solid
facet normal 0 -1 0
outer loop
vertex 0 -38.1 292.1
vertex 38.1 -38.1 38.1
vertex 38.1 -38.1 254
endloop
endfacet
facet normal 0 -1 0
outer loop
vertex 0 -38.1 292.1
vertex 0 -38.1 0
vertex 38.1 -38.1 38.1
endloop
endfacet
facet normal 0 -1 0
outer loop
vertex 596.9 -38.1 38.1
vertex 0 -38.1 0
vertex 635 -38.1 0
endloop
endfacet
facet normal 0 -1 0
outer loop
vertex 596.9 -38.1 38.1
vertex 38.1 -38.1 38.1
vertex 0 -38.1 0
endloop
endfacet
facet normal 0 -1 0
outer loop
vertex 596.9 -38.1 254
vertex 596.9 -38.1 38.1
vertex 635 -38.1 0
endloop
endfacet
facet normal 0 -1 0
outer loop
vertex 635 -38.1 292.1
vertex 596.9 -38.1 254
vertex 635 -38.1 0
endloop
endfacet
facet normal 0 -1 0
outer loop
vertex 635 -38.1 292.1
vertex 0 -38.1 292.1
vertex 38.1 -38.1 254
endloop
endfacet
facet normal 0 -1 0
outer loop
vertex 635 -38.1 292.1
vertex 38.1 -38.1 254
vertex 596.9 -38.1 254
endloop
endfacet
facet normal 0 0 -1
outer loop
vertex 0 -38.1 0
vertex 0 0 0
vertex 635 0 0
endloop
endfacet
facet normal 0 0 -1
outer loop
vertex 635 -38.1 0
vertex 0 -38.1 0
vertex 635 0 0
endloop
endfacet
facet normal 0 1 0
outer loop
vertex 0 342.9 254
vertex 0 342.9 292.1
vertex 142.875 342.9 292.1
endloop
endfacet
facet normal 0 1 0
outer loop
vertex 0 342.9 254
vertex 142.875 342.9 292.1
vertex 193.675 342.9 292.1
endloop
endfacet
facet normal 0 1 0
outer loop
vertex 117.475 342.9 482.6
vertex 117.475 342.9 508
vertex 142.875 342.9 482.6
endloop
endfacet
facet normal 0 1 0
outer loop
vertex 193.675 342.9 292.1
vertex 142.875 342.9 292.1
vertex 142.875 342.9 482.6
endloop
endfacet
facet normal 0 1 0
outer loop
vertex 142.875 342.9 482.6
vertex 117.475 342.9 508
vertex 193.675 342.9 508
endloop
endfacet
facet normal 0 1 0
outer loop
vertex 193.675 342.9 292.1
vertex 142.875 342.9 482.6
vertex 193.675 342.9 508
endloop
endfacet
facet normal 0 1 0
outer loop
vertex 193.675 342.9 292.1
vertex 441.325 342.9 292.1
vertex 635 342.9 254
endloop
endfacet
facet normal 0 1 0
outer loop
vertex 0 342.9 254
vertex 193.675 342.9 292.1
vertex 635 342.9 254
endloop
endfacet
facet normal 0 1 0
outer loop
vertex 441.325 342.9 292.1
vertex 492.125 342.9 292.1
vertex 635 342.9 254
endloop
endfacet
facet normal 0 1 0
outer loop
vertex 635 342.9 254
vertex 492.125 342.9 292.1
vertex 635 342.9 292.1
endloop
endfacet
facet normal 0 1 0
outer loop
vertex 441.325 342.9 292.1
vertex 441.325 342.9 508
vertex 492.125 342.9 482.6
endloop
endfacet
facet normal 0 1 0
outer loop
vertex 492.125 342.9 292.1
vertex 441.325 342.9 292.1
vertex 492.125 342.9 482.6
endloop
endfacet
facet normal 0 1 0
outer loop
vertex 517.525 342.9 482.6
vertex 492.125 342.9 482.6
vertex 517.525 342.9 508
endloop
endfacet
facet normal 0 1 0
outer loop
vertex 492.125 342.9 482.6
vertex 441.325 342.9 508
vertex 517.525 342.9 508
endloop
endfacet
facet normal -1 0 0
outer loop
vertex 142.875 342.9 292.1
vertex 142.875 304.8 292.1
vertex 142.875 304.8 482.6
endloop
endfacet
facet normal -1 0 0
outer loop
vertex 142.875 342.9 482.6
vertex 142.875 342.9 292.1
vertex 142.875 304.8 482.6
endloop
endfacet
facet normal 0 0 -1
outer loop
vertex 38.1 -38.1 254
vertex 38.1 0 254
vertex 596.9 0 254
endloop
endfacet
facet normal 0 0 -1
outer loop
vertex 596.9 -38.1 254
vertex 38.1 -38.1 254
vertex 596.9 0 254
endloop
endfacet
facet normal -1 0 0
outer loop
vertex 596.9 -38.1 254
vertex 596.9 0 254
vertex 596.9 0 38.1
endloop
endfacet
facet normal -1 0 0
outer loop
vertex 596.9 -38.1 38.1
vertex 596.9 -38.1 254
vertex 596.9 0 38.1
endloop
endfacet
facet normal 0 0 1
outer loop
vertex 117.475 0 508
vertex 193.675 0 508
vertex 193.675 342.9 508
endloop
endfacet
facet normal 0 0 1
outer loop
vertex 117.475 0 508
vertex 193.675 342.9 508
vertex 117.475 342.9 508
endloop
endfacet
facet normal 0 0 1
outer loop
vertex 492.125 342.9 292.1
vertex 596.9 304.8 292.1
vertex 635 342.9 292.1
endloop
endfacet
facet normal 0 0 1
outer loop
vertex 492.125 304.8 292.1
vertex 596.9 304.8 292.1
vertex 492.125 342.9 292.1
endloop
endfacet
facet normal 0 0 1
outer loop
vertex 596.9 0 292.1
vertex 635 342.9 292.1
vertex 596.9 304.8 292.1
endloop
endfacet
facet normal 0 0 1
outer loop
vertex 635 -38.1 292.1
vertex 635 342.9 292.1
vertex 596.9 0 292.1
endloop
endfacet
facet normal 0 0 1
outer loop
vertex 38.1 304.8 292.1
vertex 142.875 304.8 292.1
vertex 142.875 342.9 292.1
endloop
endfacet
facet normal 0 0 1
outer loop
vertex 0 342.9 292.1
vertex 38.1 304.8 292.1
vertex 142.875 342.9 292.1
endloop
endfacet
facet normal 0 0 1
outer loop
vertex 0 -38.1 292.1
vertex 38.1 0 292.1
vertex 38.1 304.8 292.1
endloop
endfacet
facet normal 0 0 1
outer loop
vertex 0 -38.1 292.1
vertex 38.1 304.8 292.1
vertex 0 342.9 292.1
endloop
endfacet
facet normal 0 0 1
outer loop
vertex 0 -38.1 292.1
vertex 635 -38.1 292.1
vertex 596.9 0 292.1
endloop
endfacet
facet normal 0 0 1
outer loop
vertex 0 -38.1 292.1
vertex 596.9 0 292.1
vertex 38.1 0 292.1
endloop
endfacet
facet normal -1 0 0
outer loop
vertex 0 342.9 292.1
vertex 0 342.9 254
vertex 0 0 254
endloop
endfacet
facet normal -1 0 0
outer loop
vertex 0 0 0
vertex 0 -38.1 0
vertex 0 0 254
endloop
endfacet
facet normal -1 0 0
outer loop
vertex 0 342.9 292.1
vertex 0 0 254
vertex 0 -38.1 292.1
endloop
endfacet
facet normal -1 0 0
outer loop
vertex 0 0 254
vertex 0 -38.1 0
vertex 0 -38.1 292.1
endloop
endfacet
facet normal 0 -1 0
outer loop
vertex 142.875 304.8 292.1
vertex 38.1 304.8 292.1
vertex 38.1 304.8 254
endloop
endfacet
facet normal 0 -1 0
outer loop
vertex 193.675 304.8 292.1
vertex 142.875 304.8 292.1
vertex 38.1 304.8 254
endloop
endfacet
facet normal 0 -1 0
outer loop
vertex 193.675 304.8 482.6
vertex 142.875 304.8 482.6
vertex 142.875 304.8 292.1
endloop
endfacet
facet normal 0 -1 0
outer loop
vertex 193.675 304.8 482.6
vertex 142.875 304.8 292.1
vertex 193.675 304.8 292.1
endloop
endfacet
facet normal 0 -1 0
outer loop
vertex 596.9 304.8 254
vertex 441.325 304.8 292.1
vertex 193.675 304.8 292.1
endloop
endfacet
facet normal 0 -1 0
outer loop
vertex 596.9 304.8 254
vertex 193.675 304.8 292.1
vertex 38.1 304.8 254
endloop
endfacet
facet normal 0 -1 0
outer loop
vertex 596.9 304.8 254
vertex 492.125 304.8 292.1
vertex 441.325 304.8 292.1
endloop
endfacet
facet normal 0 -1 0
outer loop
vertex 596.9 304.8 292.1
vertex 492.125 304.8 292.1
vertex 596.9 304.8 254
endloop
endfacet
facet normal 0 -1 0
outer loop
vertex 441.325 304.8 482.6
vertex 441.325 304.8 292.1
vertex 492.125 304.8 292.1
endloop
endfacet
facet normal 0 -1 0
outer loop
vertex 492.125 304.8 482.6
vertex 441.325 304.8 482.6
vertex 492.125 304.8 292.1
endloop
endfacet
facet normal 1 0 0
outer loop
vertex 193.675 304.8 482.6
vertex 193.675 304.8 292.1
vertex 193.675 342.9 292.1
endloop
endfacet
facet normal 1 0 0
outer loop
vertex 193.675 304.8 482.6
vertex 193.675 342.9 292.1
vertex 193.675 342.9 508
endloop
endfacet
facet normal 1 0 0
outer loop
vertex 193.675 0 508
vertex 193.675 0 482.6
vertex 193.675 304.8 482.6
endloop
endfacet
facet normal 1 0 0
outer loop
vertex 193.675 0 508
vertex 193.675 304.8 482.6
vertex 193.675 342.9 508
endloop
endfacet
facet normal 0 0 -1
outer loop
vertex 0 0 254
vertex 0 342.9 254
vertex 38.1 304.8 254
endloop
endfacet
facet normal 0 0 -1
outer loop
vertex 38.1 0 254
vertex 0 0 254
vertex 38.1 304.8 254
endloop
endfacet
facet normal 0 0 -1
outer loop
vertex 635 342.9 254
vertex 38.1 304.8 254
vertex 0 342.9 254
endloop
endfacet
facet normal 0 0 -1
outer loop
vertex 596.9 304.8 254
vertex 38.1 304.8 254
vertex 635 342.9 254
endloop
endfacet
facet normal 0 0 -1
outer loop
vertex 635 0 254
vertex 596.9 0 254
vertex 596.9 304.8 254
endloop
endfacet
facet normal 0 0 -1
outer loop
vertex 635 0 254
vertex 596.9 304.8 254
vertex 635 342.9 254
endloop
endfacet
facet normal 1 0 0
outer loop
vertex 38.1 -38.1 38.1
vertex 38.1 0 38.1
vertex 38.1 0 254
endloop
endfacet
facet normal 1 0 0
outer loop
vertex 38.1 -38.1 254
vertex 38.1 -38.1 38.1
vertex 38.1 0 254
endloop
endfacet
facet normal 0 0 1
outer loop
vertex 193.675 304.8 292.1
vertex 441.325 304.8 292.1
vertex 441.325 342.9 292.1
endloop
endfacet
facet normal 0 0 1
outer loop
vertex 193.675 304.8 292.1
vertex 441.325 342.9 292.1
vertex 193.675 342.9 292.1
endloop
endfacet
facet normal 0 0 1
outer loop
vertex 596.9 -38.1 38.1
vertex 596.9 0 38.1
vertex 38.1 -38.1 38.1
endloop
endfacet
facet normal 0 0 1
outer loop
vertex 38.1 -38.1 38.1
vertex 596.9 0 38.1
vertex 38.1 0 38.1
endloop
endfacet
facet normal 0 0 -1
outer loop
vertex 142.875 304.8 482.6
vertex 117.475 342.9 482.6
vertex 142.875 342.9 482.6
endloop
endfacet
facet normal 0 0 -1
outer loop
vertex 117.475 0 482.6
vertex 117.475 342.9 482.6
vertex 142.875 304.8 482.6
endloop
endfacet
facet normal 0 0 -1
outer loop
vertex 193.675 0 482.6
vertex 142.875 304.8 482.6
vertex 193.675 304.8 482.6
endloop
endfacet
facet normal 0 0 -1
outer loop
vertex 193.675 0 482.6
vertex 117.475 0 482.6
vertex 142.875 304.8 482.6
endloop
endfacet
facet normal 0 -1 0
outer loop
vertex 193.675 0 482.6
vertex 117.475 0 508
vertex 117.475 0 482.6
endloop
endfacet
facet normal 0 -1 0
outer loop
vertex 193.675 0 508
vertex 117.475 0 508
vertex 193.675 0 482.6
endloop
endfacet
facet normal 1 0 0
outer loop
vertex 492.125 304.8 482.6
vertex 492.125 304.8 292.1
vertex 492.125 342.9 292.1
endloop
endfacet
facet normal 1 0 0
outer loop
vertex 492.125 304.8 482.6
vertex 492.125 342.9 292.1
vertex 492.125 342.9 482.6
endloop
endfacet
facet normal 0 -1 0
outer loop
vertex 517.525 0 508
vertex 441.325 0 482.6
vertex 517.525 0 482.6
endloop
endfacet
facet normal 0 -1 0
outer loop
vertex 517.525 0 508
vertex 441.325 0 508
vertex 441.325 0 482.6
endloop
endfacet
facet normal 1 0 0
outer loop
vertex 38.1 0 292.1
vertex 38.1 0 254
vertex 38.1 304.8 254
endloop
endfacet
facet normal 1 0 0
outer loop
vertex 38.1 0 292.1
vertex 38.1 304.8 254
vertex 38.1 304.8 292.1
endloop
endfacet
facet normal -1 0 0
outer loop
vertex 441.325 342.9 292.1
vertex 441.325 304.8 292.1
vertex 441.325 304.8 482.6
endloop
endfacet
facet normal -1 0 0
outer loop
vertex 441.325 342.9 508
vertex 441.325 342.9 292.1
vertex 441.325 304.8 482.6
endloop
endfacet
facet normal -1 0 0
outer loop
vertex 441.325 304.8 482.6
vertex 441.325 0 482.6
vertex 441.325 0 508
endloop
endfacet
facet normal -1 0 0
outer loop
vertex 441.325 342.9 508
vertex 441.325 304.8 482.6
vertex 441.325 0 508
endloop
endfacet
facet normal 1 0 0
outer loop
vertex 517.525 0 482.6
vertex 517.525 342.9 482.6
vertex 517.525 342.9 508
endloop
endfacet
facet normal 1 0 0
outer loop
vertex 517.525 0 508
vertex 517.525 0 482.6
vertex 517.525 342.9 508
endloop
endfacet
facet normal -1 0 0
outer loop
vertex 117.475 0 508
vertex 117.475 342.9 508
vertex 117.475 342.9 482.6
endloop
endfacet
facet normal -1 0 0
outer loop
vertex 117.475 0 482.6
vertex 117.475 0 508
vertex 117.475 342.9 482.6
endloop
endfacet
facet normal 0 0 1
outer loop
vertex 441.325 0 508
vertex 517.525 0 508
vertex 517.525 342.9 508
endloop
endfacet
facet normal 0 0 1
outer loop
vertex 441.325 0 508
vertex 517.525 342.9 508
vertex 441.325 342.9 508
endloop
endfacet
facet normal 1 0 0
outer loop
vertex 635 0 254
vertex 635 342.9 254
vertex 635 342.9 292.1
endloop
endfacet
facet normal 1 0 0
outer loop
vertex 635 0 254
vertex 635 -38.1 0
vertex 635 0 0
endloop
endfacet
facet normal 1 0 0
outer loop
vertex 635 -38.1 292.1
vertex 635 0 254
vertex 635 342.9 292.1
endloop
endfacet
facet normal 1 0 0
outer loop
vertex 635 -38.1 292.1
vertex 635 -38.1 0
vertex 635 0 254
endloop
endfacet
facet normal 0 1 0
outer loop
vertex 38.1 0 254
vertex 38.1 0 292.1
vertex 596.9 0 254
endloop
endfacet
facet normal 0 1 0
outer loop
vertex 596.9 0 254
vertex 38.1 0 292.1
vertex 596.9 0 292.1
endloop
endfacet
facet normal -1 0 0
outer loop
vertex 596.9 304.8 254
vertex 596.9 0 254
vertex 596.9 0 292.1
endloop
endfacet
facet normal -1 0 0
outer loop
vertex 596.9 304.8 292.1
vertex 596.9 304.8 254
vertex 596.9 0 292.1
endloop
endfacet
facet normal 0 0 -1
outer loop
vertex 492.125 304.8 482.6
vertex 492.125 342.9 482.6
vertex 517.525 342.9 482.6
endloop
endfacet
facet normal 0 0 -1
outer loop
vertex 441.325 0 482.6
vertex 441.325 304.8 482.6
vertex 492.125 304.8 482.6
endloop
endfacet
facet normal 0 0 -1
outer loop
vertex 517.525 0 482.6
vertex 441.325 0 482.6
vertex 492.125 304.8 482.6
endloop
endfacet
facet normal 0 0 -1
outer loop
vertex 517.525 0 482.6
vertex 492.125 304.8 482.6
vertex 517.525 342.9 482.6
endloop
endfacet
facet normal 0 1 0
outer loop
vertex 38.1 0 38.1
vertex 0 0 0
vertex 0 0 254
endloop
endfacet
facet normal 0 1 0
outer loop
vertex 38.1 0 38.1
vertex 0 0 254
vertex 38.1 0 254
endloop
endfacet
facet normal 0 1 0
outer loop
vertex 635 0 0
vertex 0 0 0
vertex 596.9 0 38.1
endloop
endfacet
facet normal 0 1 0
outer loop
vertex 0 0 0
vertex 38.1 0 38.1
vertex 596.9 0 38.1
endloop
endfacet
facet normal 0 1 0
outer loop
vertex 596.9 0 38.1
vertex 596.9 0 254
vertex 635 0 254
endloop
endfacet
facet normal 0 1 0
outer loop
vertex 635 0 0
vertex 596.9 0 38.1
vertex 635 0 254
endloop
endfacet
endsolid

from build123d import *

# Parameters (mm, degrees)
F0_W     = 38.1
F0_H     = 38.1
F1_DEPTH = 38.1
F2_DEPTH = 304.8
F3_START = -304.8
F3_DEPTH = 38.1
F4_START = -304.8
F0_W_2   = 50.8
F0_H_2   = 190.5
F4_DEPTH = 38.1
F5_DEPTH = 342.9


with BuildPart() as f1:
    # F0 (on Front) → F1 (new body)
    with BuildSketch(Plane.XZ):
        Polygon((596.9, 38.1), (38.1, 38.1), (38.1, 254), (0, 254), (0, 0), (635, 0), (635, 254), (596.9, 254), align=None)
        with Locations((19.05, 273.05)):
            Rectangle(F0_W, F0_H)
        Polygon((38.1, 292.1), (38.1, 254), (596.9, 254), (596.9, 292.1), (492.125, 292.1), (441.325, 292.1), (193.675, 292.1), (142.875, 292.1), align=None)
        with Locations((615.95, 273.05)):
            Rectangle(F0_W, F0_H)
    extrude(amount=F1_DEPTH)

    # F0 (on Front) → F2 (join)
    with BuildSketch(Plane.XZ):
        with Locations((19.05, 273.05)):
            Rectangle(F0_W, F0_H)
        with Locations((615.95, 273.05)):
            Rectangle(F0_W, F0_H)
    extrude(amount=-F2_DEPTH)

    # F0 (on Front) → F3 (join)
    with BuildSketch(Plane.XZ.offset(F3_START)):
        Polygon((38.1, 292.1), (38.1, 254), (596.9, 254), (596.9, 292.1), (492.125, 292.1), (441.325, 292.1), (193.675, 292.1), (142.875, 292.1), align=None)
        with Locations((19.05, 273.05)):
            Rectangle(F0_W, F0_H)
        with Locations((615.95, 273.05)):
            Rectangle(F0_W, F0_H)
    extrude(amount=-F3_DEPTH)

    # F0 (on Front) → F4 (join)
    with BuildSketch(Plane.XZ.offset(F4_START)):
        with Locations((168.275, 387.35)):
            Rectangle(F0_W_2, F0_H_2)
        with Locations((466.725, 387.35)):
            Rectangle(F0_W_2, F0_H_2)
    extrude(amount=-F4_DEPTH)

    # F0 (on Front) → F5 (join)
    with BuildSketch(Plane.XZ):
        Polygon((117.475, 482.6), (142.875, 482.6), (193.675, 482.6), (193.675, 508), (117.475, 508), align=None)
        Polygon((441.325, 482.6), (492.125, 482.6), (517.525, 482.6), (517.525, 508), (441.325, 508), align=None)
    extrude(amount=-F5_DEPTH)


solid = f1.part
